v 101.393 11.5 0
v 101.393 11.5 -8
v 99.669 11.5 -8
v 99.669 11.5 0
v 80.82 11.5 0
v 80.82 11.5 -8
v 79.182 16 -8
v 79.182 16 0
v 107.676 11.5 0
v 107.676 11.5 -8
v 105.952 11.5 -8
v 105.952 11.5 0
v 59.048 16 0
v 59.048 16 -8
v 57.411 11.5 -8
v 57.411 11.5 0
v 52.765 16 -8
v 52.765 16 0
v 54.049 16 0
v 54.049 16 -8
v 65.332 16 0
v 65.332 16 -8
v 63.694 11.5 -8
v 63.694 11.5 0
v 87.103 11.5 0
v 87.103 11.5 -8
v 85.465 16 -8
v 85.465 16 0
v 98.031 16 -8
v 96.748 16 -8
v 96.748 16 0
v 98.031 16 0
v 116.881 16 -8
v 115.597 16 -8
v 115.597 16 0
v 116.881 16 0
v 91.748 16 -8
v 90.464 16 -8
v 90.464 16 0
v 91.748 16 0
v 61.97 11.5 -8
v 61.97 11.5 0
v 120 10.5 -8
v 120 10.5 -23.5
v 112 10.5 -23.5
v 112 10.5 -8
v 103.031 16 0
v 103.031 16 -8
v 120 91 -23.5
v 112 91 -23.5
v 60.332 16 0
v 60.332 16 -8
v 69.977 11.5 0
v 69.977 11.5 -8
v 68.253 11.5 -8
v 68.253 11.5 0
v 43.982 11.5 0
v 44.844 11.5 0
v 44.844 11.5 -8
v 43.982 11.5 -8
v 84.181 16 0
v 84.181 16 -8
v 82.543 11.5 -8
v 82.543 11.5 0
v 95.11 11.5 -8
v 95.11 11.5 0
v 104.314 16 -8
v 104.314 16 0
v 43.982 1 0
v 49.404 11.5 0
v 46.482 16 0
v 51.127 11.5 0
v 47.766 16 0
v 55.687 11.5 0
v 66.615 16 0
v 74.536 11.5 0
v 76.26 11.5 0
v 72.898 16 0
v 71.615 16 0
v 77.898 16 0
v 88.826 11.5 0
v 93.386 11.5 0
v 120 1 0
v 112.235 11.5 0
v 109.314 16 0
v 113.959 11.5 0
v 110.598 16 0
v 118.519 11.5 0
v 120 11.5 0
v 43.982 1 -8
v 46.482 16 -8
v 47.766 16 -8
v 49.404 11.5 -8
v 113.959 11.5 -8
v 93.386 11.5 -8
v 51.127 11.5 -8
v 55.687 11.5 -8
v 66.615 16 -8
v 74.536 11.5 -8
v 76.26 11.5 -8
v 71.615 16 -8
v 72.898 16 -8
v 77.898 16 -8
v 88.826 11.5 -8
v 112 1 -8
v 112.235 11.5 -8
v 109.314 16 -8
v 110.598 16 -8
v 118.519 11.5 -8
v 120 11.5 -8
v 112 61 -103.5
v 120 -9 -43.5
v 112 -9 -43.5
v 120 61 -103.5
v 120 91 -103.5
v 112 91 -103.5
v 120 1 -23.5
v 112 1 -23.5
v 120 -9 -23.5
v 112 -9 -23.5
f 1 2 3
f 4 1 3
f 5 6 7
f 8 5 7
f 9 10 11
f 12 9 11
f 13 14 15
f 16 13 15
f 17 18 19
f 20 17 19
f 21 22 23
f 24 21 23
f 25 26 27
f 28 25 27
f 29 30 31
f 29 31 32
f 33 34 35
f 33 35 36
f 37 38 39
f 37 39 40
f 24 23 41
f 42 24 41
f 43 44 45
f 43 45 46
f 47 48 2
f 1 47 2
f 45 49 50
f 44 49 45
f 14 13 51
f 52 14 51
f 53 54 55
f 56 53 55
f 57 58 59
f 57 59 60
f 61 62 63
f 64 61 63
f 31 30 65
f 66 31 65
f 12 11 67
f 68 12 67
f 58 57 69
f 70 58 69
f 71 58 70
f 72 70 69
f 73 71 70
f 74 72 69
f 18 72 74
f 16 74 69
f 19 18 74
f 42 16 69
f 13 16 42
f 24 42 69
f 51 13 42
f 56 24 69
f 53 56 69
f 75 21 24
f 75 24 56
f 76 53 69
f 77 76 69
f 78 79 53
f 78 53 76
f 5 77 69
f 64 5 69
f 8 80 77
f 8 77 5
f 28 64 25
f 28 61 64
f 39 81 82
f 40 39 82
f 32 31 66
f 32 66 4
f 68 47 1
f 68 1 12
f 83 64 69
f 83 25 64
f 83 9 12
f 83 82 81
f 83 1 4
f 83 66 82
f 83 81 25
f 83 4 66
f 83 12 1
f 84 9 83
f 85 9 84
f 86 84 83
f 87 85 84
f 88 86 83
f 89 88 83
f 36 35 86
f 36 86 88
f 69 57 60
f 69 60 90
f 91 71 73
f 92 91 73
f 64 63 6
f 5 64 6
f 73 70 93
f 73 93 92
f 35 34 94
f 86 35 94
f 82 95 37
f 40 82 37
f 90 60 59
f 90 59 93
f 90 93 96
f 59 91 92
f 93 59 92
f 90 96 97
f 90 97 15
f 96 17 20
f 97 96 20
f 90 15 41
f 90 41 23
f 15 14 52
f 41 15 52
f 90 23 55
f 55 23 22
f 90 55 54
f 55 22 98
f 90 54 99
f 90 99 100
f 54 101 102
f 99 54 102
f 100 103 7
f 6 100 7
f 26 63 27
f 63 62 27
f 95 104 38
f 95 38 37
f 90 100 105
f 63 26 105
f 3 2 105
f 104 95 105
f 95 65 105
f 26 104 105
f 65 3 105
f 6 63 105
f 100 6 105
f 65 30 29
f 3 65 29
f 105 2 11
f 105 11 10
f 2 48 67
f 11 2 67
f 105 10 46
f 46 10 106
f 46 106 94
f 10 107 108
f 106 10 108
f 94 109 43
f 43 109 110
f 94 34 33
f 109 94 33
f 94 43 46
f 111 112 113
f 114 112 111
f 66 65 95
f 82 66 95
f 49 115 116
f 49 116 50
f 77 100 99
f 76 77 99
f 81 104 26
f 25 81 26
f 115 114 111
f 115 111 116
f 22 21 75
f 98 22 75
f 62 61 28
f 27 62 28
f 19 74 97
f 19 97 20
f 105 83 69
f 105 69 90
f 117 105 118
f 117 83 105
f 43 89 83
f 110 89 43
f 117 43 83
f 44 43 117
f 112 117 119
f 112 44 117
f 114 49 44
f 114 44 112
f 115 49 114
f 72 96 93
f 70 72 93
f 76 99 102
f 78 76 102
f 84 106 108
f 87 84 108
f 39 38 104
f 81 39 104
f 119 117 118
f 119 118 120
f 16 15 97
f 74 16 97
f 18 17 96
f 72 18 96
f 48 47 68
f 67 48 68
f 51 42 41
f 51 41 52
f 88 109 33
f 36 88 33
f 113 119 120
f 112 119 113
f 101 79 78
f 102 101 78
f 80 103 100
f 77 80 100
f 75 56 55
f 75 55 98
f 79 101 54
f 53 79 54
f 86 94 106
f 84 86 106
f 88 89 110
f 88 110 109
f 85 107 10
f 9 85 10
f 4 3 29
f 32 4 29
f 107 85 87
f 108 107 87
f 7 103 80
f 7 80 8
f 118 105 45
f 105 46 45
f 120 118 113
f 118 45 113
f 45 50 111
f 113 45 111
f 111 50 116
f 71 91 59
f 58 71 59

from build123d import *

# Parameters (mm, degrees)
BLANKSKE_W          = 120
BLANKSKE_H          = 16
BLANK_DEPTH         = 8
TOOTHCUTSIM_DEPTH   = 122.326007105
TEETHCUTS_COUNT     = 20
TEETHCUTS_PITCH     = 6.2831853
SKETCH1_W           = 8
SKETCH1_H           = 1
CUT_EXTRUDE1_DEPTH  = 122.326007105
BOSS_EXTRUDE2_DEPTH = 8
CUT_EXTRUDE2_DEPTH  = 183.738200713


with BuildPart() as part:
    # BlankSke → Blank (new body)
    with BuildSketch(Plane.XY):
        with Locations((60, 8)):
            Rectangle(BLANKSKE_W, BLANKSKE_H)
    extrude(amount=-BLANK_DEPTH)

    # TooCutSkeSim → ToothCutSim (cut, through all)
    with BuildSketch(Plane.XY):
        Polygon((0.861870739, 11.5), (-0.861870739, 11.5), (-2.508981637, 16.0254), (2.508981637, 16.0254), align=None)
    toothcutsim = extrude(amount=-TOOTHCUTSIM_DEPTH, mode=Mode.SUBTRACT)

    # TeethCuts: ToothCutSim ×20
    with Locations(*[(i * TEETHCUTS_PITCH, 0, 0) for i in range(1, TEETHCUTS_COUNT)]):
        add(toothcutsim, mode=Mode.SUBTRACT)

    # Sketch1 → Cut-Extrude1 (cut, through all)
    with BuildSketch(Plane(origin=(120, 0, 0), x_dir=(0, 0, -1), z_dir=(1, 0, 0))):
        with Locations((4, 0.5)):
            Rectangle(SKETCH1_W, SKETCH1_H)
    extrude(amount=-CUT_EXTRUDE1_DEPTH, mode=Mode.SUBTRACT)

    # Sketch2 → Boss-Extrude2 (add)
    with BuildSketch(Plane(origin=(120, 0, 0), x_dir=(0, 0, -1), z_dir=(1, 0, 0))):
        Polygon((8, 1), (23.5, 1), (23.5, -9), (43.5, -9), (103.5, 61), (103.5, 91), (23.5, 91), (23.5, 10.5), (8, 10.5), align=None)
    extrude(amount=-BOSS_EXTRUDE2_DEPTH)

    # Sketch3 → Cut-Extrude2 (cut, through all)
    with BuildSketch(Plane.XY):
        with BuildLine():
            Line((0, 1), (0, 11.5))
            ThreePointArc((0, 11.5), (0.43093537, 11.93093537), (0.861870739, 11.5))
            Line((0.861870739, 11.5), (2.499736794, 16))
            Line((2.499736794, 16), (3.783448506, 16))
            Line((3.783448506, 16), (5.421314561, 11.5))
            Line((5.421314561, 11.5), (7.145056039, 11.5))
            Line((7.145056039, 11.5), (8.782922094, 16))
            Line((8.782922094, 16), (10.066633806, 16))
            Line((10.066633806, 16), (11.704499861, 11.5))
            Line((11.704499861, 11.5), (13.428241339, 11.5))
            Line((13.428241339, 11.5), (15.066107394, 16))
            Line((15.066107394, 16), (15.70796325, 16))
            Line((15.70796325, 16), (16.349819106, 16))
            Line((16.349819106, 16), (17.987685161, 11.5))
            Line((17.987685161, 11.5), (19.711426639, 11.5))
            Line((19.711426639, 11.5), (21.349292694, 16))
            Line((21.349292694, 16), (22.633004406, 16))
            Line((22.633004406, 16), (24.270870461, 11.5))
            Line((24.270870461, 11.5), (25.994611939, 11.5))
            Line((25.994611939, 11.5), (27.632477994, 16))
            Line((27.632477994, 16), (28.916189706, 16))
            Line((28.916189706, 16), (30.554055761, 11.5))
            Line((30.554055761, 11.5), (32.277797239, 11.5))
            Line((32.277797239, 11.5), (33.915663294, 16))
            Line((33.915663294, 16), (35.199375006, 16))
            Line((35.199375006, 16), (36.837241061, 11.5))
            Line((36.837241061, 11.5), (37.6991118, 11.5))
            Line((37.6991118, 11.5), (38.560982539, 11.5))
            Line((38.560982539, 11.5), (40.198848594, 16))
            Line((40.198848594, 16), (41.482560306, 16))
            Line((41.482560306, 16), (43.120426361, 11.5))
            Line((43.120426361, 11.5), (43.9822971, 11.5))
            Line((43.9822971, 11.5), (43.9822971, 1))
            Line((43.9822971, 1), (37.6991118, 1))
            Line((37.6991118, 1), (17.987685161, 1))
            Line((17.987685161, 1), (15.70796325, 1))
            Line((15.70796325, 1), (6.161314561, 1))
            Line((6.161314561, 1), (0, 1))
        make_face()
    extrude(amount=-CUT_EXTRUDE2_DEPTH, mode=Mode.SUBTRACT)


solid = part.part
